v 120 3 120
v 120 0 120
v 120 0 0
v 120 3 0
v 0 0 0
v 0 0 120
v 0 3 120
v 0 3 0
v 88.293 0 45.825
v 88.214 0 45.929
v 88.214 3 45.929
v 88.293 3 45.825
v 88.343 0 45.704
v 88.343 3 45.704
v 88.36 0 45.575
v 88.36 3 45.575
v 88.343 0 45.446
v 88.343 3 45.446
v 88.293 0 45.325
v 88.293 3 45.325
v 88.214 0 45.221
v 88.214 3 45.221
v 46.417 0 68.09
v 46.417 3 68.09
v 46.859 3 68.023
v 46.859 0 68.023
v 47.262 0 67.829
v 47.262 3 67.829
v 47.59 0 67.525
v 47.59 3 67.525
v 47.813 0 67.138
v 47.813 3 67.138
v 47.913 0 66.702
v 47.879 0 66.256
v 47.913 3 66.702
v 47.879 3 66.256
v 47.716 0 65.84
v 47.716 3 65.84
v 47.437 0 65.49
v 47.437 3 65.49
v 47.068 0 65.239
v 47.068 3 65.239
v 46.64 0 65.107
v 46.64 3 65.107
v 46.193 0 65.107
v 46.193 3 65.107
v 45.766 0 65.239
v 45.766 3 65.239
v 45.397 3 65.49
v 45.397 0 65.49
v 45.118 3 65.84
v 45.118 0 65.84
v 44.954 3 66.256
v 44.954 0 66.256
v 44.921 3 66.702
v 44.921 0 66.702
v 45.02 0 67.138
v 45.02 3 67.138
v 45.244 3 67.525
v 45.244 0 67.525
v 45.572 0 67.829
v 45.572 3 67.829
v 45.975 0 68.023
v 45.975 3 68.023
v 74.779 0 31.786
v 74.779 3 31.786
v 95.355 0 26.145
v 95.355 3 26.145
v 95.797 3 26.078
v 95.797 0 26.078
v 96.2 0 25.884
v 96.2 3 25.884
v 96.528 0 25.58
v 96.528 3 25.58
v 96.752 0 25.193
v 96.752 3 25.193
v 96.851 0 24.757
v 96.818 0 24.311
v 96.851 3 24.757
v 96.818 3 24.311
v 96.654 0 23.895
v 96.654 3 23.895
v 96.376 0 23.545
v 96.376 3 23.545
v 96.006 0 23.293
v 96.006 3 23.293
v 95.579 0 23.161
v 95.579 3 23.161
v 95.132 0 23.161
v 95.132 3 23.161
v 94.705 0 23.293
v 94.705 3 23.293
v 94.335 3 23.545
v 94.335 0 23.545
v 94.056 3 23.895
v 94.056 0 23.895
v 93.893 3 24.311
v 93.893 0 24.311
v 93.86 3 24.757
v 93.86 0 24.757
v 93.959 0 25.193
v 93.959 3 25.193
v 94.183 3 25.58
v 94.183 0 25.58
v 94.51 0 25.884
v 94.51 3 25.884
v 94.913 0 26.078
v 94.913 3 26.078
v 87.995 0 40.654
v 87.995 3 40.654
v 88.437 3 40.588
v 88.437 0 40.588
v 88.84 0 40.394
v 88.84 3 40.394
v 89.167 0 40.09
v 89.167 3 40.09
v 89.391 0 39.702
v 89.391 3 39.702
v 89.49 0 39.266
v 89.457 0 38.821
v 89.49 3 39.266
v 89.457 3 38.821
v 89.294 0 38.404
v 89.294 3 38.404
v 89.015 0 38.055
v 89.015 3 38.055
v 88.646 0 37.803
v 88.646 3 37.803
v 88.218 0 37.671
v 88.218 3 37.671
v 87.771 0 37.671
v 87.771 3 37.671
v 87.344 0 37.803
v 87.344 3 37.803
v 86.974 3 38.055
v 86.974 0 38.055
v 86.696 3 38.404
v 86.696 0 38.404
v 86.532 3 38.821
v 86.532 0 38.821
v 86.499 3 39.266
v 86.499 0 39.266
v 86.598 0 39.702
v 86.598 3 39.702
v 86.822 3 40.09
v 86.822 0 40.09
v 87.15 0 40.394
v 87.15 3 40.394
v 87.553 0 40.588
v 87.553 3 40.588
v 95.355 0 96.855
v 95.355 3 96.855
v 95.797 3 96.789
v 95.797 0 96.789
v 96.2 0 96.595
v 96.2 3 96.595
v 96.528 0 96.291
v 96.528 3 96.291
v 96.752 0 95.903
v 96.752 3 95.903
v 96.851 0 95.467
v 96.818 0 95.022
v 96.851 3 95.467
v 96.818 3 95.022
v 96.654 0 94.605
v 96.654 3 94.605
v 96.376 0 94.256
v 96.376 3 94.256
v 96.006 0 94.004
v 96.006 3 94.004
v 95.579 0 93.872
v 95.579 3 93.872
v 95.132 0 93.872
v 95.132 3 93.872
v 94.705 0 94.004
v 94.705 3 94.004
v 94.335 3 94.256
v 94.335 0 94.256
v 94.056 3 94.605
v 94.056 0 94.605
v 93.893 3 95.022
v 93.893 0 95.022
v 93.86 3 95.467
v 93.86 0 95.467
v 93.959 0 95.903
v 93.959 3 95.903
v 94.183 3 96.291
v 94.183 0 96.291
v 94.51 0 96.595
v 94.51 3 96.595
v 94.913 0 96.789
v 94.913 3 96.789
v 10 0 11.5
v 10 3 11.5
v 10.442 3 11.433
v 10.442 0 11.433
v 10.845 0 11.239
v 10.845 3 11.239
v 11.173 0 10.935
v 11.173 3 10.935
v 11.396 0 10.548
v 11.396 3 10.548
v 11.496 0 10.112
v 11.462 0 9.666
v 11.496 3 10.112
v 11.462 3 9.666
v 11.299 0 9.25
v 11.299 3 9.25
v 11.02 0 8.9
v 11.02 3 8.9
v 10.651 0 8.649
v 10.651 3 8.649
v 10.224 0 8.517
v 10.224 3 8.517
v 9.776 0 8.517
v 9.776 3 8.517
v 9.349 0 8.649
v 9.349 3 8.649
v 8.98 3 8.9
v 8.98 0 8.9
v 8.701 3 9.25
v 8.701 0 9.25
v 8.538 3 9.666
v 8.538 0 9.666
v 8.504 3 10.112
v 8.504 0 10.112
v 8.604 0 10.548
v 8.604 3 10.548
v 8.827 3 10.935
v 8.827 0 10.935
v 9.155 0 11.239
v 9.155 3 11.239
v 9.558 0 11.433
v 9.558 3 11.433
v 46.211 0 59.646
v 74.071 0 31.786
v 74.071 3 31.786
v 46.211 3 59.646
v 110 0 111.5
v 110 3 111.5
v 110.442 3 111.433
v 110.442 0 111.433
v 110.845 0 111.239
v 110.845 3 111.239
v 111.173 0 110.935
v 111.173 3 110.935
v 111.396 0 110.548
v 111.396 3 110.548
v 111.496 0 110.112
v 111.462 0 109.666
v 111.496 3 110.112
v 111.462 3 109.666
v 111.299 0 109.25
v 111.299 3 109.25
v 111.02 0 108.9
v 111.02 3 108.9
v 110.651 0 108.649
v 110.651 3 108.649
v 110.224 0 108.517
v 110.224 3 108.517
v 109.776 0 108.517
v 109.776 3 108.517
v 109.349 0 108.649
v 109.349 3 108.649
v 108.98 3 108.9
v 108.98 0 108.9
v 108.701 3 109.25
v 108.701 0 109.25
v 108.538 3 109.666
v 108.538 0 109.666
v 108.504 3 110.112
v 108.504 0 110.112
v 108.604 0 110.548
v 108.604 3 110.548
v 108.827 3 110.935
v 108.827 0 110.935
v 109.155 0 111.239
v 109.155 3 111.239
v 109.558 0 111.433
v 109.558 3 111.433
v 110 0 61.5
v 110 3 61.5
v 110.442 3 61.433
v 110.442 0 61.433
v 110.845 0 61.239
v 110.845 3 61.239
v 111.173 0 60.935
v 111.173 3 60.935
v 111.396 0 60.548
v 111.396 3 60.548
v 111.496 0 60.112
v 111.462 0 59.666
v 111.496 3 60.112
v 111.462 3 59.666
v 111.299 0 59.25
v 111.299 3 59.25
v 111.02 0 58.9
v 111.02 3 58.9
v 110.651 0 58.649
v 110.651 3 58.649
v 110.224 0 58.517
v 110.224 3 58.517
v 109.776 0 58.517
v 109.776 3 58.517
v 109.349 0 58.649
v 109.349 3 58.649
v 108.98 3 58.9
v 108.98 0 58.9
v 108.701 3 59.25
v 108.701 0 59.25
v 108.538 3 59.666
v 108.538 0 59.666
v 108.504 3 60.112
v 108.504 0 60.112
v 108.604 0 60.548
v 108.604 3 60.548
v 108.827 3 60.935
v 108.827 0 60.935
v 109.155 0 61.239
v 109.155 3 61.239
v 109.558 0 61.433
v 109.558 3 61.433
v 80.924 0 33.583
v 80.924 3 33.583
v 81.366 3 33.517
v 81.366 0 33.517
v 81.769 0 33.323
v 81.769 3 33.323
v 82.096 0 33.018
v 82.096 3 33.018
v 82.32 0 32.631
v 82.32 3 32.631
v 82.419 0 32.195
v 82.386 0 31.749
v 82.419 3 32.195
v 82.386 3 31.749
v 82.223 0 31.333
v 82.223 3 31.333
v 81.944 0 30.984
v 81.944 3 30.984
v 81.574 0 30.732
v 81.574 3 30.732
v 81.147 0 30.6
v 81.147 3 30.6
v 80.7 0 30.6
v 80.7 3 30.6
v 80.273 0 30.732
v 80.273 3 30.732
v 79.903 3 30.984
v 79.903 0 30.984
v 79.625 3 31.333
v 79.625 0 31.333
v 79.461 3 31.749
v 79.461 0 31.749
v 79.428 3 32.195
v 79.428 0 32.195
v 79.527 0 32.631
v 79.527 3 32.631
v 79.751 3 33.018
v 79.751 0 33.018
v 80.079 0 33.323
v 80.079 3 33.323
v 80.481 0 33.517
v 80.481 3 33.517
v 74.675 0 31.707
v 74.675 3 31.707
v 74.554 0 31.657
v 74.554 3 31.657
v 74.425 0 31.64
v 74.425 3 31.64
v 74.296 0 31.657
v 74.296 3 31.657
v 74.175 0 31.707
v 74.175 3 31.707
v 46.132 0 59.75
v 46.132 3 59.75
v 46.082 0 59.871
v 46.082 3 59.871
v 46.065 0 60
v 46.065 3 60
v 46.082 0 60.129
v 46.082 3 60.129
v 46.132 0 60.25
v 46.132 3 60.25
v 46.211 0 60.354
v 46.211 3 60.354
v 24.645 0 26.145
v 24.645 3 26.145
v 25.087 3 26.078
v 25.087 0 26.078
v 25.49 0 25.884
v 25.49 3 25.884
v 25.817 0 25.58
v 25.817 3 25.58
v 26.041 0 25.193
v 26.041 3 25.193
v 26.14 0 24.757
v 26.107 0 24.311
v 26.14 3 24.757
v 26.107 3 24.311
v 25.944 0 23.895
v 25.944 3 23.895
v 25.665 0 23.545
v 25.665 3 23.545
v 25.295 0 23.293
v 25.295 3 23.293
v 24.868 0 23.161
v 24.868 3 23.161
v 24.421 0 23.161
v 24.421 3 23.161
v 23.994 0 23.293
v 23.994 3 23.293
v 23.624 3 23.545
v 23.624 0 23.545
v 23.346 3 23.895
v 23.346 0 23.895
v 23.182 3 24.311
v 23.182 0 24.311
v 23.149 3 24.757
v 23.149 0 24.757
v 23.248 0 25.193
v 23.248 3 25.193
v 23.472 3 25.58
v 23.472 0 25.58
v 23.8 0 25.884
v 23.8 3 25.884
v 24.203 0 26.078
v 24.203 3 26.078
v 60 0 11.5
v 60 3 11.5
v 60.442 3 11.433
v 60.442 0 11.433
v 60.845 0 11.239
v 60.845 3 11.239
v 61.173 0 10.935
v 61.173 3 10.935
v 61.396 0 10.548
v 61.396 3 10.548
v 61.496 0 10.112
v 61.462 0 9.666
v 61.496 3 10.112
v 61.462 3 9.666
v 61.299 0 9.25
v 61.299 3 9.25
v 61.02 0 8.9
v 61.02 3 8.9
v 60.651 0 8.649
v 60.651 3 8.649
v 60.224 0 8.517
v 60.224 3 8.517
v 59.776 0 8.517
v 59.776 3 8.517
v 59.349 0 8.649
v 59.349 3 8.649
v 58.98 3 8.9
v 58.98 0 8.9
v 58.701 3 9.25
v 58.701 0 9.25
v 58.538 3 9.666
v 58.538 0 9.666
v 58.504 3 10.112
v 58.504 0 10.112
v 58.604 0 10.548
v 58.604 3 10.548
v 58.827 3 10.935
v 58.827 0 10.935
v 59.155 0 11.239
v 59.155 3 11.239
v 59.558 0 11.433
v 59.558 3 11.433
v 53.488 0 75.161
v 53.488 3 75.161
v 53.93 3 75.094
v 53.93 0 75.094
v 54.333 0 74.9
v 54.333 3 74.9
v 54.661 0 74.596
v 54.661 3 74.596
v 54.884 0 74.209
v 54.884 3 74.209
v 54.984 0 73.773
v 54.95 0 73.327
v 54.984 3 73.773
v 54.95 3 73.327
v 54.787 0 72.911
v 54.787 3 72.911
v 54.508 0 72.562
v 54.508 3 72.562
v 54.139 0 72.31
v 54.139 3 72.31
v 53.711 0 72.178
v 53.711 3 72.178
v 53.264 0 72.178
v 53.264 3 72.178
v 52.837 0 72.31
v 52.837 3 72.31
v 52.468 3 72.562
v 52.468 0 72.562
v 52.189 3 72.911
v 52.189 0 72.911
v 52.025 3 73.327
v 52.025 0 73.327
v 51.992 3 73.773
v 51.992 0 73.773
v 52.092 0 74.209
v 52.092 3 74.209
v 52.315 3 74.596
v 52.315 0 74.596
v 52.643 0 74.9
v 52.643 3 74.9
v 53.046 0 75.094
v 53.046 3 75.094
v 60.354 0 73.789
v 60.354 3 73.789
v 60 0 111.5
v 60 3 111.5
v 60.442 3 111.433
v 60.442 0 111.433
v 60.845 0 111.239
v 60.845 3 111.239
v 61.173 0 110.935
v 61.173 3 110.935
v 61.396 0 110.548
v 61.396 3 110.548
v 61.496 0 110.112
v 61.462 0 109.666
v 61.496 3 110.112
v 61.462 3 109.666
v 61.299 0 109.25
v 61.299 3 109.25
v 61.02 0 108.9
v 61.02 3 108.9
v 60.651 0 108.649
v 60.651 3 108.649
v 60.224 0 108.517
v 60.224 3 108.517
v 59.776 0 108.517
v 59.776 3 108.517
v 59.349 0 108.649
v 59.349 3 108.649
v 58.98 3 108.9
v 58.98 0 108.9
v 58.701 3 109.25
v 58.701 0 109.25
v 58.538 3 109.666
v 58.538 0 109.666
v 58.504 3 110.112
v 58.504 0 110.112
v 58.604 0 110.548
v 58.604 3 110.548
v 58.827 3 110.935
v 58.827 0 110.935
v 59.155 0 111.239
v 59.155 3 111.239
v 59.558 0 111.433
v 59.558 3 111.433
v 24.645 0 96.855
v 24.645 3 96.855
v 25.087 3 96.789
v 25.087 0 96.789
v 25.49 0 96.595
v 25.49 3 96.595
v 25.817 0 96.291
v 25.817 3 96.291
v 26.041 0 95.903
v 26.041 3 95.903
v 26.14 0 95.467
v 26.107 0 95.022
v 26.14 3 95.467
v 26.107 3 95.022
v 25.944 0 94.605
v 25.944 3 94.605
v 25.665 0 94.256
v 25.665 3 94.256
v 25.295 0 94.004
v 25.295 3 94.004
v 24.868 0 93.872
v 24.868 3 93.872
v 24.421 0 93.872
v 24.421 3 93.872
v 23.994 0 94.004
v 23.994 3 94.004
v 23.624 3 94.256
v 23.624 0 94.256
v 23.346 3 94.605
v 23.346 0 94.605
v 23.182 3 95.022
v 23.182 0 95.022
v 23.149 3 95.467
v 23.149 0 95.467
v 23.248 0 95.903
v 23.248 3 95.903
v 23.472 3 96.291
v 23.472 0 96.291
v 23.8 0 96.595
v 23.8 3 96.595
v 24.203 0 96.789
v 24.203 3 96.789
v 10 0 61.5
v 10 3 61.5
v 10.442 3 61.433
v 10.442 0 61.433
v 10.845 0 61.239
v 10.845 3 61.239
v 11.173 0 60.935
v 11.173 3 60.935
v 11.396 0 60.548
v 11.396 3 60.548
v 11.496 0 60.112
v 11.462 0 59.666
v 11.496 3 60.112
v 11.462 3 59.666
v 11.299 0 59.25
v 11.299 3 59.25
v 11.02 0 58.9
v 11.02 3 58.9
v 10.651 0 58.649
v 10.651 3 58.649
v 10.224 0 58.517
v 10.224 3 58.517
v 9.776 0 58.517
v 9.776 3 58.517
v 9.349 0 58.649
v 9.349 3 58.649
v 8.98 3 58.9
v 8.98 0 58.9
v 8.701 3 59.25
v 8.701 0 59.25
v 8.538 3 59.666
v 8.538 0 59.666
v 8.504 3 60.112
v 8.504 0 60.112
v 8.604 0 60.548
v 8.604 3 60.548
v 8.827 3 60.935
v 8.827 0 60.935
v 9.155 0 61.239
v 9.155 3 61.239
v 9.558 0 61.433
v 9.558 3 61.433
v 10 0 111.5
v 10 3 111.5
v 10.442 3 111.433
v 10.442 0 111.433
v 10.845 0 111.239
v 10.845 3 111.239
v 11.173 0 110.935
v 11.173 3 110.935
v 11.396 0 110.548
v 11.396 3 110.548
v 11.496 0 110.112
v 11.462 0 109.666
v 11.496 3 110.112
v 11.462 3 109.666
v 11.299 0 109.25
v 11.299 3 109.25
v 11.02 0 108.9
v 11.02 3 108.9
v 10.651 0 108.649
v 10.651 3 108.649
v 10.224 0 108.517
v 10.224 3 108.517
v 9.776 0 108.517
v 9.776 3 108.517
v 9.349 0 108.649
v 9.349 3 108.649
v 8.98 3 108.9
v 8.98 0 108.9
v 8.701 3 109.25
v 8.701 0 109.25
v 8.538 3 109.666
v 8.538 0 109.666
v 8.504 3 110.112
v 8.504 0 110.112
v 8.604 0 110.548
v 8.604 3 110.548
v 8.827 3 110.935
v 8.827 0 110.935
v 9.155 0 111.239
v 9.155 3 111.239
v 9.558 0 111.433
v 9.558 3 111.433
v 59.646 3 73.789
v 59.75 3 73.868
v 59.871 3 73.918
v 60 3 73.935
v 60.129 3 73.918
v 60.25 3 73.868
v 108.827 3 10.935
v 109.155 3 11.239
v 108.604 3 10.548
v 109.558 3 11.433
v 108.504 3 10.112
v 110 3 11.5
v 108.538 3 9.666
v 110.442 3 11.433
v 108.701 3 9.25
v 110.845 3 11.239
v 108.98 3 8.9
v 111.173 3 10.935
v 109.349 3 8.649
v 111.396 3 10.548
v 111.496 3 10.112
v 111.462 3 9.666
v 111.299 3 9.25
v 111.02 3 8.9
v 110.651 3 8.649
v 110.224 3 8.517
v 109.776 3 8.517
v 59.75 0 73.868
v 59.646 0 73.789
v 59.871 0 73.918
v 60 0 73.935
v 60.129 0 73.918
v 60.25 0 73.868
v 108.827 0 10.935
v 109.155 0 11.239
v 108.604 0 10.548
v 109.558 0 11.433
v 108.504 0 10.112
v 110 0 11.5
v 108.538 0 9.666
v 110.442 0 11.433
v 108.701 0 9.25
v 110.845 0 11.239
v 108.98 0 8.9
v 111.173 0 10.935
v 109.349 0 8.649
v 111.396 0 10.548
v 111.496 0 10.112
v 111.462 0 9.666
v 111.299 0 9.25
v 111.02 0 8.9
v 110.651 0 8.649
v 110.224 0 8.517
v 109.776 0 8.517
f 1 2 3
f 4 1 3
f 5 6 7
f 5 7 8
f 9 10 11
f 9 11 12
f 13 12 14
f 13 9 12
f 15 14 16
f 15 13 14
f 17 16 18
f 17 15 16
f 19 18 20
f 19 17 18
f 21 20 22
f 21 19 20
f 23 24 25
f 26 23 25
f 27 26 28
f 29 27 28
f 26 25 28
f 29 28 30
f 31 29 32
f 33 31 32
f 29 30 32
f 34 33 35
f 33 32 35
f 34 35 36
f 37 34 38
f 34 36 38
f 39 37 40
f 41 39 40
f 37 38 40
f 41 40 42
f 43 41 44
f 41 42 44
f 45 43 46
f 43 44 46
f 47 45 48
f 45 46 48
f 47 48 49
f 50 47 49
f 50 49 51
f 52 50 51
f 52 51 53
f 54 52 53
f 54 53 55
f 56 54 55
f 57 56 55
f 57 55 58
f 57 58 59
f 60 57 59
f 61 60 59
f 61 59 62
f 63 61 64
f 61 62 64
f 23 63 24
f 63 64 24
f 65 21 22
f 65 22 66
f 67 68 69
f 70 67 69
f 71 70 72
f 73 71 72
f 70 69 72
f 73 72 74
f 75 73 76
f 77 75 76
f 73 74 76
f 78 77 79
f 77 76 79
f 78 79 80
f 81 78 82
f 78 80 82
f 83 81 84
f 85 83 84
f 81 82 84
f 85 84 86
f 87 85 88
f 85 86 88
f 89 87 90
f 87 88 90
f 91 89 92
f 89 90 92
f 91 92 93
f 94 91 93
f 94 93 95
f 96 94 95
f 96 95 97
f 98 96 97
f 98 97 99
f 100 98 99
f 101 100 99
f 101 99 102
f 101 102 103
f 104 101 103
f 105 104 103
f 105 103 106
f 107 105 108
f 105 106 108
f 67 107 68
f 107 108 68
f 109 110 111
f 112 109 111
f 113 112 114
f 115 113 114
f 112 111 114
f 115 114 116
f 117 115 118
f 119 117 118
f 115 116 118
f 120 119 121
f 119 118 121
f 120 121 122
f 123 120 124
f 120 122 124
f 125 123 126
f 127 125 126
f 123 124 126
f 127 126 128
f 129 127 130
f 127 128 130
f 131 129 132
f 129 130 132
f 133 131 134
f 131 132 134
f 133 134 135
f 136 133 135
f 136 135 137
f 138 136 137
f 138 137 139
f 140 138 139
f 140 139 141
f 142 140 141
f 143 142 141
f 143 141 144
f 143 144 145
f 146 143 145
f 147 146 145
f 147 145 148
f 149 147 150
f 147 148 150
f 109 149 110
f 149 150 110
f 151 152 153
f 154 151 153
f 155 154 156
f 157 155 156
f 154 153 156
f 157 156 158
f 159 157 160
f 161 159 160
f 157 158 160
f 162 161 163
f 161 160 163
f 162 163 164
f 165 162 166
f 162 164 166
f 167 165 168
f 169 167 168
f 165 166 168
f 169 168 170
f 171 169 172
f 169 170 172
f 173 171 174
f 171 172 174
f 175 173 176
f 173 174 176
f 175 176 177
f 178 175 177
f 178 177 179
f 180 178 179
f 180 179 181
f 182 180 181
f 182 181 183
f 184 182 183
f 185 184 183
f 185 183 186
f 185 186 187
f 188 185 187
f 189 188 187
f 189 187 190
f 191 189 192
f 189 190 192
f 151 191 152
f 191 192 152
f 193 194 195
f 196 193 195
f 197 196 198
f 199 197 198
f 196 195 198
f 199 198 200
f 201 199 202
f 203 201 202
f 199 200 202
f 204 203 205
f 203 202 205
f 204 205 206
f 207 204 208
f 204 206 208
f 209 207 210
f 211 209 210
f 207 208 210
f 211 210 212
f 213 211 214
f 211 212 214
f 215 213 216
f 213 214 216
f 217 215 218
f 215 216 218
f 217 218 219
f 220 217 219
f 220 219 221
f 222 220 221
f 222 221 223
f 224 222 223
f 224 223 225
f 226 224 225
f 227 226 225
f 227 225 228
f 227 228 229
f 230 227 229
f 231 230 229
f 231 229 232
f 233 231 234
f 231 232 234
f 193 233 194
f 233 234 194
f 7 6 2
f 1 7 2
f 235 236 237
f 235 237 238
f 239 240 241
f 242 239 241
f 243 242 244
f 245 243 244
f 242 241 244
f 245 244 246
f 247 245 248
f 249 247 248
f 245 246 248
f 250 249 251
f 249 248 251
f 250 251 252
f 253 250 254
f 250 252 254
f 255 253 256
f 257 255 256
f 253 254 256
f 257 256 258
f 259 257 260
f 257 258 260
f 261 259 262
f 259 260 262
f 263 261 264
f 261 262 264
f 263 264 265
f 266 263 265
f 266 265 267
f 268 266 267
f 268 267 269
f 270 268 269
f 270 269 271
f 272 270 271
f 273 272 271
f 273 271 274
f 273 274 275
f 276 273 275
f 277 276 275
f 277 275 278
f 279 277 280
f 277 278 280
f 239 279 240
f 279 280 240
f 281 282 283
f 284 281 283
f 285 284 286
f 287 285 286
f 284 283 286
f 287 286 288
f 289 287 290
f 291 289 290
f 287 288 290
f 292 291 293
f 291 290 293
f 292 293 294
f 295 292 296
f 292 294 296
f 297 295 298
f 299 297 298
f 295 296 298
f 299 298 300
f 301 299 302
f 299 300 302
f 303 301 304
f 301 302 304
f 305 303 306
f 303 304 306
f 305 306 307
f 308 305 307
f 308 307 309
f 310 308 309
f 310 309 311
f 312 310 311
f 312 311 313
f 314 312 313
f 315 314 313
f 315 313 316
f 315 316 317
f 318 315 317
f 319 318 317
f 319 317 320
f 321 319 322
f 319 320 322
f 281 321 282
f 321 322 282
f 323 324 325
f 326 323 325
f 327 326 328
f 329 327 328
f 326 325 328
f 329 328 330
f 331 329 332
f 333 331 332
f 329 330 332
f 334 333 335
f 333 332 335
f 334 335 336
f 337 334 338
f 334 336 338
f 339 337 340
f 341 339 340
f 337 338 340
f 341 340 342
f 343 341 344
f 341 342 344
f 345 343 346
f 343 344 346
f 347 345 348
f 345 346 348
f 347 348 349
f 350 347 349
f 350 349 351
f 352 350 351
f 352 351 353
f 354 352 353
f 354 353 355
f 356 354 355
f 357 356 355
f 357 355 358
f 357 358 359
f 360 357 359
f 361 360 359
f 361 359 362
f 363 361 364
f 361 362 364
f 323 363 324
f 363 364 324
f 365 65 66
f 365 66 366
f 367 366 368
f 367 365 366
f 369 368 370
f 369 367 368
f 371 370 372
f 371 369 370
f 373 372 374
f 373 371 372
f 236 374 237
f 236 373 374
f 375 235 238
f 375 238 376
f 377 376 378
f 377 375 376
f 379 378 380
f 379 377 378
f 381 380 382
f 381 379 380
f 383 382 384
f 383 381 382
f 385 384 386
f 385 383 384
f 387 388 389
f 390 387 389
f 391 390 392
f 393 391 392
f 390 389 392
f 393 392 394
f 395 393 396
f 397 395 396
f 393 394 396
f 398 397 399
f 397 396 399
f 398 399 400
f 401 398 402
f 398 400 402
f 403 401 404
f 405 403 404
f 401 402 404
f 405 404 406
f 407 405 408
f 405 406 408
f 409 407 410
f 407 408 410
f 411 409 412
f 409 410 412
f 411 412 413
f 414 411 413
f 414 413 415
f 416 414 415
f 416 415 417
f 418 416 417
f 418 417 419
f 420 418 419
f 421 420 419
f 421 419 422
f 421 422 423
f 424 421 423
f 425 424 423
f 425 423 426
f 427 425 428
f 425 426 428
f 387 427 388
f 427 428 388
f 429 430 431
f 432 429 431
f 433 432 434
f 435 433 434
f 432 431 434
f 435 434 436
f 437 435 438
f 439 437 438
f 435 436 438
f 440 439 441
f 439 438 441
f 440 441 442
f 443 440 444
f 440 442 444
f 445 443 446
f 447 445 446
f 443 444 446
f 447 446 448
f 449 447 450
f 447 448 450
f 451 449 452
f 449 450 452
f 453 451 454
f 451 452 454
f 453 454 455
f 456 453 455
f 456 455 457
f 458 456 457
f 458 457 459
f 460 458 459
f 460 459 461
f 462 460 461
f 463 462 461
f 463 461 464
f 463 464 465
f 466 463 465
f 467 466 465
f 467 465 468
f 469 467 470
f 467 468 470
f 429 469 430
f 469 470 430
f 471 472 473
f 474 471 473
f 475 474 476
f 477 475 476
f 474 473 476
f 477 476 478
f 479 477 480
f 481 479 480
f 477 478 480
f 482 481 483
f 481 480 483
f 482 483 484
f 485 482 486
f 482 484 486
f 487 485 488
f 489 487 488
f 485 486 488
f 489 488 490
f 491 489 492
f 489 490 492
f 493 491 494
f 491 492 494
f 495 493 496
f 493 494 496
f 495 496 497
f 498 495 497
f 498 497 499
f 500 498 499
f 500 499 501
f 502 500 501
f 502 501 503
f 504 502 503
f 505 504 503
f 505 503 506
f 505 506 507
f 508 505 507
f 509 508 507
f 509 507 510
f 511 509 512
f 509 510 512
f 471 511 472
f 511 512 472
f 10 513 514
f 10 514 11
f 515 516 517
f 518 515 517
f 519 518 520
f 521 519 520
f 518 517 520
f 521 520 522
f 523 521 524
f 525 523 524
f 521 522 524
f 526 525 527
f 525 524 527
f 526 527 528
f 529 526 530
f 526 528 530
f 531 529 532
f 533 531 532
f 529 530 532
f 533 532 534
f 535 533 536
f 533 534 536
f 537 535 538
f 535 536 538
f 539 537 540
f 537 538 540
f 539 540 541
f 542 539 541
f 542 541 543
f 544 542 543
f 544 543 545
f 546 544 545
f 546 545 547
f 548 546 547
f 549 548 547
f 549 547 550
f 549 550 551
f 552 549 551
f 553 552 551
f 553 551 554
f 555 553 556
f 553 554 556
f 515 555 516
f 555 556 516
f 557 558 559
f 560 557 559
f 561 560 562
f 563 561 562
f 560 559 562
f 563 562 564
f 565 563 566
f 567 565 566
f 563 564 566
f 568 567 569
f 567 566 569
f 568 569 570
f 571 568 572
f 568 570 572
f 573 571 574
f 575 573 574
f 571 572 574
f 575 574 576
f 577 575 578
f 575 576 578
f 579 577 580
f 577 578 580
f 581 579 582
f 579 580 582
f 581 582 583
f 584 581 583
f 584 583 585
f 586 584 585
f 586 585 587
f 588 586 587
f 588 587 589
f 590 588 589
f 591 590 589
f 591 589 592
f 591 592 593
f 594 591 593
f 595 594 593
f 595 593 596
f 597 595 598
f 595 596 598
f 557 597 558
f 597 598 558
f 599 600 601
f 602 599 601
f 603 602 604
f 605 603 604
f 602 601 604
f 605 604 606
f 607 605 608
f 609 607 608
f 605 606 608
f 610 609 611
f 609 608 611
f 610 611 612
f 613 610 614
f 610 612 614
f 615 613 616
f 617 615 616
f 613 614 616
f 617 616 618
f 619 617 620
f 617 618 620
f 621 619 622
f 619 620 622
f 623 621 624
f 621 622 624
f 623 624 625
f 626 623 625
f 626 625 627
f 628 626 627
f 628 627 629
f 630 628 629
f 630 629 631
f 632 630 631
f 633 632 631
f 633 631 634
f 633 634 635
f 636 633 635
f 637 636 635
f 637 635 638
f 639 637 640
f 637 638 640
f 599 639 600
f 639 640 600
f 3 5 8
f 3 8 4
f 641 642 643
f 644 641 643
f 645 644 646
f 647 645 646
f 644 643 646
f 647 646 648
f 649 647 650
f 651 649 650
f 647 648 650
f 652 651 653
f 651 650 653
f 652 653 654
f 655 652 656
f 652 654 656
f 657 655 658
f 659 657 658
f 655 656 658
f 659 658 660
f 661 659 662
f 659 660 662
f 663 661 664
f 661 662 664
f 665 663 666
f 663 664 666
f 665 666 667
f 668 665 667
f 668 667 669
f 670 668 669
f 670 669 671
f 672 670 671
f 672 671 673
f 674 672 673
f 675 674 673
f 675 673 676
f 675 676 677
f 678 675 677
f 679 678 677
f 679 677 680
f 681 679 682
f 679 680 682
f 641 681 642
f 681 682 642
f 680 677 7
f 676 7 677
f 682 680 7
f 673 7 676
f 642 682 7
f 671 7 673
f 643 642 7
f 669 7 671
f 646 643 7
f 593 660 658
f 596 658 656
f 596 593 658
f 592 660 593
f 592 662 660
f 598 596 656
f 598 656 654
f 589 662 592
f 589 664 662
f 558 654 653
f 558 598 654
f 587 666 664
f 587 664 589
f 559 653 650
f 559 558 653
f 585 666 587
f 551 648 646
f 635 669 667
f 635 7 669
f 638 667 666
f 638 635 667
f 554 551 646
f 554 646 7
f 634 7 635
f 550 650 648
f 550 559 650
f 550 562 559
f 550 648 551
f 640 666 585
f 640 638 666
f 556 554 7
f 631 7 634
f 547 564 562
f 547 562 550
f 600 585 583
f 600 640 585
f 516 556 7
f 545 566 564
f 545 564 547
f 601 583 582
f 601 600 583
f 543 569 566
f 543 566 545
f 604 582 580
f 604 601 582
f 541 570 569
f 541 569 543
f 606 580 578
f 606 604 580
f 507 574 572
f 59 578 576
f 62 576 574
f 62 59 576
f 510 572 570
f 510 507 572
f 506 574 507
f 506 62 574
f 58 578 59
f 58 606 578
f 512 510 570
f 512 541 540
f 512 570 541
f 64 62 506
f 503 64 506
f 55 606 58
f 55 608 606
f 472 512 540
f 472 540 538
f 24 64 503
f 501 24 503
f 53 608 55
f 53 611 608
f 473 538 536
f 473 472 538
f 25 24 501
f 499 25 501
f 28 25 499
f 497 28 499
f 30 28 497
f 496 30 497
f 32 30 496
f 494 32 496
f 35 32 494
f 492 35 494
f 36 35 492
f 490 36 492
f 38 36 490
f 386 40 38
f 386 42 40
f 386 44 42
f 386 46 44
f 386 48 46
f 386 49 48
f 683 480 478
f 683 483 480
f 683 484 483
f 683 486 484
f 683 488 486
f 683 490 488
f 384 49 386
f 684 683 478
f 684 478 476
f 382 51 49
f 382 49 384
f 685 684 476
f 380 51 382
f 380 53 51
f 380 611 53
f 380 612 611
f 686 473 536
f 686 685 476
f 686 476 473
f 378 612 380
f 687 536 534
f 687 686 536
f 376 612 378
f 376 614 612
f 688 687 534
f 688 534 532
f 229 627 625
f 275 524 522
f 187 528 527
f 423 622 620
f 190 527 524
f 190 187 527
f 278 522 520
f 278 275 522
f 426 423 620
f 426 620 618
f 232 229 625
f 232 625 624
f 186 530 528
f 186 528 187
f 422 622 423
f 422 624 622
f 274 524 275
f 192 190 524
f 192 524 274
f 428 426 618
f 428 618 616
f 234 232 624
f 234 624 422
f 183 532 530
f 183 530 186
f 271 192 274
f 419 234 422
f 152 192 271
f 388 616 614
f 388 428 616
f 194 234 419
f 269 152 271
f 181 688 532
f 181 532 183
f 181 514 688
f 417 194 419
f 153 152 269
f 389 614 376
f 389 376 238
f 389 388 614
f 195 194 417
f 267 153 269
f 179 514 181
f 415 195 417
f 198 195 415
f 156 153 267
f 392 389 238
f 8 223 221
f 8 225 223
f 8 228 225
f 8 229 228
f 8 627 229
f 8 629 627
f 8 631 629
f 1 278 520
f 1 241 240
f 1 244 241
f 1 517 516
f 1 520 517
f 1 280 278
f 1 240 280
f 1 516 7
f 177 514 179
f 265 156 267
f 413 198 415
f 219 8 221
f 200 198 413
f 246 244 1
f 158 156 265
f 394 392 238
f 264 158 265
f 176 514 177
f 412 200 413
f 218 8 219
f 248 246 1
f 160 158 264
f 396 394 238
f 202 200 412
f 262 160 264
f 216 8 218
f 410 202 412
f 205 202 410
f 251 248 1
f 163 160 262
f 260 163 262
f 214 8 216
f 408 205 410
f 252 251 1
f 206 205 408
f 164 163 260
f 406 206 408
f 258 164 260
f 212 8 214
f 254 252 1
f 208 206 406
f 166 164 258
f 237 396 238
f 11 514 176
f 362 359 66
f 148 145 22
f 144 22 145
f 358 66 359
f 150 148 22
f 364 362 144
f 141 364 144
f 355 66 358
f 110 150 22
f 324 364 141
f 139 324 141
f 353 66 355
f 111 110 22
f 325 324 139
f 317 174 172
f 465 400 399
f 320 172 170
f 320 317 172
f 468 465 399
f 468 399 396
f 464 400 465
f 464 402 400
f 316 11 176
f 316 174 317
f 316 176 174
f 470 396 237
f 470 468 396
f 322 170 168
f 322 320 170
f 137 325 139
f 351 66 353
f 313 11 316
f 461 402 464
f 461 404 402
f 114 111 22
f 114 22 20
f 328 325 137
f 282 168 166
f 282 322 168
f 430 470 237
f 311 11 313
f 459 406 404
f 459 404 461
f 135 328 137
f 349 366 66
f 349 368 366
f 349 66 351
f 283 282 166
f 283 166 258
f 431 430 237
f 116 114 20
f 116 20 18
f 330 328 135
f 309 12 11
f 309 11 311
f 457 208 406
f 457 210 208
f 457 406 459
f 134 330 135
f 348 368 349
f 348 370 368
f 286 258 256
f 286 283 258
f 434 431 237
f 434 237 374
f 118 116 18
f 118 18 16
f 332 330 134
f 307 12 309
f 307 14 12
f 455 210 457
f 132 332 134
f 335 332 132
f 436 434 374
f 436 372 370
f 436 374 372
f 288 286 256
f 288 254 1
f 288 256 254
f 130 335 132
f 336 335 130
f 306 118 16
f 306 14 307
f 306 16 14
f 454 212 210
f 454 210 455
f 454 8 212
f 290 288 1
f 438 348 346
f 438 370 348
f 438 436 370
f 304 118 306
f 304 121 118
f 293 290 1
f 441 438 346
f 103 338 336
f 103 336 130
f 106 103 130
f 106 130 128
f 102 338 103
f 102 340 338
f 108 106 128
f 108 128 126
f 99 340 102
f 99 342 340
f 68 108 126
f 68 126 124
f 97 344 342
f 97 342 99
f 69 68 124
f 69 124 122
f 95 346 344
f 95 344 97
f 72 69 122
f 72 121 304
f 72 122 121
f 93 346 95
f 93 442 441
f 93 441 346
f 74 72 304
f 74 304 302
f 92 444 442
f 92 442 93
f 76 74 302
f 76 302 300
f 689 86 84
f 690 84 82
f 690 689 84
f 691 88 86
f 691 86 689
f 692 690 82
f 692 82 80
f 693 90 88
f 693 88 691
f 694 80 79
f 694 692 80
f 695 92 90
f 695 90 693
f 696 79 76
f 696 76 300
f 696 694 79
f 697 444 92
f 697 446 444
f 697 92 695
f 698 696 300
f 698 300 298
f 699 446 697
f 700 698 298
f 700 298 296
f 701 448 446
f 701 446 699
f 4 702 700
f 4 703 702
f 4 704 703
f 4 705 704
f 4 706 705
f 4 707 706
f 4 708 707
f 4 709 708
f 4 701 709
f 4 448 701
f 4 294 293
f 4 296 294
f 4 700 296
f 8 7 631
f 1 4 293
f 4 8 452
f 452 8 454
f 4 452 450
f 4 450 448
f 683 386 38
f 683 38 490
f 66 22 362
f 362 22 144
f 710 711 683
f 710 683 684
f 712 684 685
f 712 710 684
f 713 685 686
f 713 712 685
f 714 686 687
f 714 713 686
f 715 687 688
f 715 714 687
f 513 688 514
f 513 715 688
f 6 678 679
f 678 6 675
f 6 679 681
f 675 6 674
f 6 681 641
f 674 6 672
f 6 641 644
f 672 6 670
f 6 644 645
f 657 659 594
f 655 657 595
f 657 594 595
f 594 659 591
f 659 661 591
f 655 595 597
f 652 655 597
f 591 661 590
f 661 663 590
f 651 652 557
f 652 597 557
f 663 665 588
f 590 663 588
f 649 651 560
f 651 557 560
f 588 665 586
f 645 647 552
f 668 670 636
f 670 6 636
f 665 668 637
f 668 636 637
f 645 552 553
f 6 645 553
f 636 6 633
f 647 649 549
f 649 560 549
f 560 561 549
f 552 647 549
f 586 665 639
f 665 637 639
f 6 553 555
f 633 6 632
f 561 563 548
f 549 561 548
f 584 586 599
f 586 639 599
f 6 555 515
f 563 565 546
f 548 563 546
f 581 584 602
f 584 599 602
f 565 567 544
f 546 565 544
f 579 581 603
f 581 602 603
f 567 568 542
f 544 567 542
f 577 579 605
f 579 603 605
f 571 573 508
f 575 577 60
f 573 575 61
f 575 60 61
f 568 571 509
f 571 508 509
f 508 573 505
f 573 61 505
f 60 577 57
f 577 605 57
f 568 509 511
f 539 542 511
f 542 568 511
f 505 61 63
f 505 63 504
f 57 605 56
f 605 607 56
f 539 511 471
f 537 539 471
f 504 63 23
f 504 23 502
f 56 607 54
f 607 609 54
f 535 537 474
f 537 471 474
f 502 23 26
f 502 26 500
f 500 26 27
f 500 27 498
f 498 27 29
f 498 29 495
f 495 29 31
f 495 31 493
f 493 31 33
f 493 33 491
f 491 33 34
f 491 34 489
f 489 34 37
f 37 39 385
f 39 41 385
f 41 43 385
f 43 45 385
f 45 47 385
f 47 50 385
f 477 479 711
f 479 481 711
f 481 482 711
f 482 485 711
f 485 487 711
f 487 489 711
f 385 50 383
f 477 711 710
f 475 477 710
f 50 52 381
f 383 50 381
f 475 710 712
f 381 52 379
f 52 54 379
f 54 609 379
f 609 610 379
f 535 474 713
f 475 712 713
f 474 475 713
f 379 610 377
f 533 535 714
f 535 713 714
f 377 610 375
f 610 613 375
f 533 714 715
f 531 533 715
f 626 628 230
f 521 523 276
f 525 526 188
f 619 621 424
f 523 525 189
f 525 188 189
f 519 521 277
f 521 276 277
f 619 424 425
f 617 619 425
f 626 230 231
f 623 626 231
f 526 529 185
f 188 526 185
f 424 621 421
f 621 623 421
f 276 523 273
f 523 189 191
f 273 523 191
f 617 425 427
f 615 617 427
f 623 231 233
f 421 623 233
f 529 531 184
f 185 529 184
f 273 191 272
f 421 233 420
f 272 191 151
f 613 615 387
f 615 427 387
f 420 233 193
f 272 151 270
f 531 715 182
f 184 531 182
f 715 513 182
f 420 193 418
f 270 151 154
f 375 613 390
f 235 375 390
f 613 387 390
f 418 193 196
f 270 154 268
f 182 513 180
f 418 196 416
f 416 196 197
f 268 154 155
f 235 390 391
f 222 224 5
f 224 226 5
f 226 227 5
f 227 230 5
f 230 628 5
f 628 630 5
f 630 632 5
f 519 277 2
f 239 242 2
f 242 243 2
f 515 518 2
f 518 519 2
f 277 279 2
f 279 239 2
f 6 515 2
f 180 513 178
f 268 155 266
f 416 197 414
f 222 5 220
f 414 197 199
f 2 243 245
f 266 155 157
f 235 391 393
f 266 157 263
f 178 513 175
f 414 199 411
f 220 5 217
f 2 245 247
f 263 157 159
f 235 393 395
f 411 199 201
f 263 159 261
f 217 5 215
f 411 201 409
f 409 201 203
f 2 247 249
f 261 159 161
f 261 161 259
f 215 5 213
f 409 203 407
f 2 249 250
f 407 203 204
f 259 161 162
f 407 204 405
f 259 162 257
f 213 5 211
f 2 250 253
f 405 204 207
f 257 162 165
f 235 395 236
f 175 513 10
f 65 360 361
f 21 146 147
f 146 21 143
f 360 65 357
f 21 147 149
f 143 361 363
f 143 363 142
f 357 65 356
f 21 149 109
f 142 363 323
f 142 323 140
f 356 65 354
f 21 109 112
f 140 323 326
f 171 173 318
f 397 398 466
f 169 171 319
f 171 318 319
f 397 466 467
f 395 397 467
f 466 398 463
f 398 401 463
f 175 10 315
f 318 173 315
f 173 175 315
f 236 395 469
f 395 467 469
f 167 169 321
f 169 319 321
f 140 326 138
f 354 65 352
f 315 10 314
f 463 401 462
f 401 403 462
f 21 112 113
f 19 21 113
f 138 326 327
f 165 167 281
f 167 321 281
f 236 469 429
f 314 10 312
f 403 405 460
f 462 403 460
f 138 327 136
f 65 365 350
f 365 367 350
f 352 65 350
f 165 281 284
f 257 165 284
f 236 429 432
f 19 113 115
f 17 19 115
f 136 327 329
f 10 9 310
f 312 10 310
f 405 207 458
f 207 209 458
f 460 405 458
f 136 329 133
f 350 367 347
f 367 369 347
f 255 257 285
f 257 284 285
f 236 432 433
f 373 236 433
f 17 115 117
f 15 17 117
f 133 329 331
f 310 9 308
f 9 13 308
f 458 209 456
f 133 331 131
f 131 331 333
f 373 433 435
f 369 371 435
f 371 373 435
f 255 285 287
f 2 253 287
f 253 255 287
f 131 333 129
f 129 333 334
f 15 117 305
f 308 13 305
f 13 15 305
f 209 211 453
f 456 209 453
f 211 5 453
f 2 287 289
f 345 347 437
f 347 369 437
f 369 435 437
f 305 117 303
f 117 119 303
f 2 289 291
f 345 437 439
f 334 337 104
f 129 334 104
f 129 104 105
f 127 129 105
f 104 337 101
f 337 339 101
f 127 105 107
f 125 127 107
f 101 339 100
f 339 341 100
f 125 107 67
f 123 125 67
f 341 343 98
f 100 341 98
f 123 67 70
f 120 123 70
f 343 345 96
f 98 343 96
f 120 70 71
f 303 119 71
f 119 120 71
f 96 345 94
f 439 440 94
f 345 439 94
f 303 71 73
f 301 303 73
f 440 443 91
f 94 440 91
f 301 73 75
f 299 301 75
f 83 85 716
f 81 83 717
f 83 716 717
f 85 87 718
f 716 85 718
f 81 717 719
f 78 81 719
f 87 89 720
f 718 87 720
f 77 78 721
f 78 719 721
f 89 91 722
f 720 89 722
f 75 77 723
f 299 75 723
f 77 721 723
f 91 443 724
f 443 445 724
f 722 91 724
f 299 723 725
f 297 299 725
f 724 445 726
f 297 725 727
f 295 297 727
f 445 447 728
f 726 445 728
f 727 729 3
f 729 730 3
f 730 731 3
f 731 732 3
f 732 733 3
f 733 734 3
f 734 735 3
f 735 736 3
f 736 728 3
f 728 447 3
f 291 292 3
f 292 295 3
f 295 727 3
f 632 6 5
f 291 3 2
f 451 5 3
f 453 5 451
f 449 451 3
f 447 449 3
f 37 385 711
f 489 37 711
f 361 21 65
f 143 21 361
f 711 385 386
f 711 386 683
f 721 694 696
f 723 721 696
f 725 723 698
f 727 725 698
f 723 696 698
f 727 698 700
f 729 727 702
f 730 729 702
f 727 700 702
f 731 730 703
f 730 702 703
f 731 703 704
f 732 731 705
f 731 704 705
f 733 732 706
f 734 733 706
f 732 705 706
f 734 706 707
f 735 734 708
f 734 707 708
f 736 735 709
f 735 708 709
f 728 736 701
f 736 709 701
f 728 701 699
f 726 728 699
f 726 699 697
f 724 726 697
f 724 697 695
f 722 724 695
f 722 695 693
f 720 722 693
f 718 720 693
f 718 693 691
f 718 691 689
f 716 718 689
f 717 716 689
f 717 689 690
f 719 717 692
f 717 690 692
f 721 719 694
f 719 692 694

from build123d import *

# Parameters (mm, degrees)
SKETCH1_W           = 120
SKETCH1_H           = 120
BOSS_EXTRUDE1_DEPTH = 3
CAVITY1_DEPTH       = 3
SKETCH5_R           = 1.5
CUT_EXTRUDE3_DEPTH  = 3
SKETCH6_R           = 1.5
CUT_EXTRUDE4_DEPTH  = 3
SKETCH8_R           = 1.5
CUT_EXTRUDE6_DEPTH  = 3


# Read off the part's stored shape, not the designer's step: Cavity1
with BuildPart() as part:
    # Sketch1 → Boss-Extrude1 (new body)
    with BuildSketch(Plane(origin=(0, 0, 0), x_dir=(1, 0, 0), z_dir=(0, 1, 0))):
        with Locations((60, -60)):
            Rectangle(SKETCH1_W, SKETCH1_H)
    extrude(amount=BOSS_EXTRUDE1_DEPTH)

    # Cavity1 outline → Cavity1 (cut)
    with BuildSketch(Plane(origin=(0, 0, 0), x_dir=(1, 0, 0), z_dir=(0, 1, 0))):
        with BuildLine():
            Line((46.211417874, -60.353557562), (59.646450781, -73.78858234))
            ThreePointArc((59.646450781, -73.78858234), (60.000004216, -73.935028843), (60.353557562, -73.788582126))
            Line((60.353557562, -73.788582126), (88.213556312, -45.928566518))
            ThreePointArc((88.213556312, -45.928566518), (88.360002815, -45.575013083), (88.213556098, -45.221459737))
            Line((88.213556098, -45.221459737), (74.778523191, -31.786434959))
            ThreePointArc((74.778523191, -31.786434959), (74.424969756, -31.639988457), (74.07141641, -31.786435173))
            Line((74.07141641, -31.786435173), (46.21141766, -59.646450781))
            ThreePointArc((46.21141766, -59.646450781), (46.064971157, -60.000004216), (46.211417874, -60.353557562))
        make_face()
    extrude(amount=CAVITY1_DEPTH, mode=Mode.SUBTRACT)

    # Sketch5 → Cut-Extrude3 (cut)
    with BuildSketch(Plane(origin=(0, 3, 0), x_dir=(1, 0, 0), z_dir=(0, 1, 0))):
        with Locations(Location((60, -10, 0), (0, 0, 270))):
            Circle(SKETCH5_R)
        with Locations(Location((95.355339059, -24.644660941, 0), (0, 0, 270))):
            Circle(SKETCH5_R)
        with Locations(Location((110, -60, 0), (0, 0, 270))):
            Circle(SKETCH5_R)
        with Locations(Location((95.355339059, -95.355339059, 0), (0, 0, 270))):
            Circle(SKETCH5_R)
        with Locations(Location((60, -110, 0), (0, 0, 270))):
            Circle(SKETCH5_R)
        with Locations(Location((24.644660941, -95.355339059, 0), (0, 0, 270))):
            Circle(SKETCH5_R)
        with Locations(Location((10, -60, 0), (0, 0, 270))):
            Circle(SKETCH5_R)
        with Locations(Location((24.644660941, -24.644660941, 0), (0, 0, 270))):
            Circle(SKETCH5_R)
    extrude(amount=-CUT_EXTRUDE3_DEPTH, mode=Mode.SUBTRACT)

    # Sketch6 → Cut-Extrude4 (cut)
    with BuildSketch(Plane(origin=(0, 3, 0), x_dir=(1, 0, 0), z_dir=(0, 1, 0))):
        with Locations(Location((10, -10, 0), (0, 0, 270))):
            Circle(SKETCH6_R)
        with Locations(Location((110, -10, 0), (0, 0, 270))):
            Circle(SKETCH6_R)
        with Locations(Location((110, -110, 0), (0, 0, 270))):
            Circle(SKETCH6_R)
        with Locations(Location((10, -110, 0), (0, 0, 270))):
            Circle(SKETCH6_R)
    extrude(amount=-CUT_EXTRUDE4_DEPTH, mode=Mode.SUBTRACT)

    # Sketch8 → Cut-Extrude6 (cut)
    with BuildSketch(Plane(origin=(0, 3, 0), x_dir=(1, 0, 0), z_dir=(0, 1, 0))):
        with Locations(Location((87.994675608, -39.154311265, 0), (0, 0, 270))):
            Circle(SKETCH8_R)
        with Locations(Location((80.923607796, -32.083243453, 0), (0, 0, 270))):
            Circle(SKETCH8_R)
        with Locations(Location((46.416796874, -66.590054375, 0), (0, 0, 270))):
            Circle(SKETCH8_R)
        with Locations(Location((53.487864686, -73.661122187, 0), (0, 0, 270))):
            Circle(SKETCH8_R)
    extrude(amount=-CUT_EXTRUDE6_DEPTH, mode=Mode.SUBTRACT)


solid = part.part
